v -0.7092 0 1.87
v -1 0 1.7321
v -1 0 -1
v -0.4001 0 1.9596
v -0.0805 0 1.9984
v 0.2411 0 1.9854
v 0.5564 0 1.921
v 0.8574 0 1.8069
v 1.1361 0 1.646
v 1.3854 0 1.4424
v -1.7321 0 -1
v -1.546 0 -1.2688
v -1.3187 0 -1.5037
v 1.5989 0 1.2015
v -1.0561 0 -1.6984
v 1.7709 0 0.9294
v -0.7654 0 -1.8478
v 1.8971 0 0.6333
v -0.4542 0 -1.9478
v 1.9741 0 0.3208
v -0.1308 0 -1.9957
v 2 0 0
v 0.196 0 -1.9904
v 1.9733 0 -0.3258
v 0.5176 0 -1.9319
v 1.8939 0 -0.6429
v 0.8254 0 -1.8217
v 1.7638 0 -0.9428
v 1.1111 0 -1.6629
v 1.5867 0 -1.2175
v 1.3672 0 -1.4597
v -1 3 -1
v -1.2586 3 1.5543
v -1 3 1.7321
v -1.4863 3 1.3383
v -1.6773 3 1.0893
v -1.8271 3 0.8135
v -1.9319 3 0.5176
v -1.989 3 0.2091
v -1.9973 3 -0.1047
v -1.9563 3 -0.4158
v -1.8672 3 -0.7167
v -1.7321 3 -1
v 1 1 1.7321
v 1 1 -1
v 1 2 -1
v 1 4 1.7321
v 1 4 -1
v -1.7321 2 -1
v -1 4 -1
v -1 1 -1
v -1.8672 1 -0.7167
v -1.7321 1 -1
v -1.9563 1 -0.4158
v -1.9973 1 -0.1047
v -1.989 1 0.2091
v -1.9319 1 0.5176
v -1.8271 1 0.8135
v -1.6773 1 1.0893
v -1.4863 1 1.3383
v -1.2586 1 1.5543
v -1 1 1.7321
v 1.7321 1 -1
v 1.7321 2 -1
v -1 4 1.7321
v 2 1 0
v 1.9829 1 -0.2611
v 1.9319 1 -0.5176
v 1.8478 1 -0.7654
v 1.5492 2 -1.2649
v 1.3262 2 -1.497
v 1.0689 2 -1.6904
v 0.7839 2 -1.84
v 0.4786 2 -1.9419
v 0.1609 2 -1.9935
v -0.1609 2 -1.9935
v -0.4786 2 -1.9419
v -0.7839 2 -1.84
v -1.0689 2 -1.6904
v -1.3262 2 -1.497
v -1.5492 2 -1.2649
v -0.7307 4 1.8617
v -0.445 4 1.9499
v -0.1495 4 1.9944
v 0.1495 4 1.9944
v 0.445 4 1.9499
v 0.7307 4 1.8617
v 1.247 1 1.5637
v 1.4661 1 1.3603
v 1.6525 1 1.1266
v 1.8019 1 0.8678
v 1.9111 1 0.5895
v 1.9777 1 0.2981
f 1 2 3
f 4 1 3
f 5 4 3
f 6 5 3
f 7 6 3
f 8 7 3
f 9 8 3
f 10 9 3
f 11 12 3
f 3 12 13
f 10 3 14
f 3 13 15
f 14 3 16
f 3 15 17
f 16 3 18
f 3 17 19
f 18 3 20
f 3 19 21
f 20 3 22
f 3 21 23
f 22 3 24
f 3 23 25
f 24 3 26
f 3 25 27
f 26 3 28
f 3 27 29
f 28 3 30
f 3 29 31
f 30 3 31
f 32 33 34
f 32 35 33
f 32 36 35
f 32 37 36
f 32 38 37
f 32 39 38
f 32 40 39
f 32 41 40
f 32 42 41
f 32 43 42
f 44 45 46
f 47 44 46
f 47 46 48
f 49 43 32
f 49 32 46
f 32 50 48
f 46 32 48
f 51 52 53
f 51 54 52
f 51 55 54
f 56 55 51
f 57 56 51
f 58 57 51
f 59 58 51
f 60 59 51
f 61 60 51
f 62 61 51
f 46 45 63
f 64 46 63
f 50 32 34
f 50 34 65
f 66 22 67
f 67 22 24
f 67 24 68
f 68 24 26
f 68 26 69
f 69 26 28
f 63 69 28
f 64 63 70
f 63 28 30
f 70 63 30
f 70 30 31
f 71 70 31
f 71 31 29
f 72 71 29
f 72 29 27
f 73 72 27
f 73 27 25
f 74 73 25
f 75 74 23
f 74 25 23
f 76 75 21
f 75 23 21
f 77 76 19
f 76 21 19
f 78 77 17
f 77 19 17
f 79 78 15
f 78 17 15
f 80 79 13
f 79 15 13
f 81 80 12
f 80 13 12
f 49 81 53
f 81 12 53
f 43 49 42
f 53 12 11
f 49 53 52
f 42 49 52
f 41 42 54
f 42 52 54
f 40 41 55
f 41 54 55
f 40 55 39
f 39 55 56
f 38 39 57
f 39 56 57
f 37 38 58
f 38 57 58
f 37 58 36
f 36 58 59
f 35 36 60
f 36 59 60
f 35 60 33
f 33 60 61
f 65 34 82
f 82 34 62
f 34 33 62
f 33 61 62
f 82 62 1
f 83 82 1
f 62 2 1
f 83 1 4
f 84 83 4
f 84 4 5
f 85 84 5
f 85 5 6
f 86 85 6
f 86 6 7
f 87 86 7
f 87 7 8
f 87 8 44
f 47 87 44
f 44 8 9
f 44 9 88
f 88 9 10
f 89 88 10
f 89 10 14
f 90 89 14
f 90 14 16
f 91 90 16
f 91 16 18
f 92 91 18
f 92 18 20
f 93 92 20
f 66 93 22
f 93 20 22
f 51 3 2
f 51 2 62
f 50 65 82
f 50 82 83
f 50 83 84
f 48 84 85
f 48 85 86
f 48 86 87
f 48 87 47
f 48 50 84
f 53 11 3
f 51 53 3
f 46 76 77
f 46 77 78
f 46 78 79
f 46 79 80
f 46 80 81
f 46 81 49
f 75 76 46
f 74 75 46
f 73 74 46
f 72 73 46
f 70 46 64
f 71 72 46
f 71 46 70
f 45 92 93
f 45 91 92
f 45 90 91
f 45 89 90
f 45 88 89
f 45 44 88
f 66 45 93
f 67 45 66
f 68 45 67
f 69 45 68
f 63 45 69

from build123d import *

# Parameters (mm, degrees)
SKETCH1_R               = 2
BOSS_EXTRUDE1_DEPTH     = 4
SKETCH2_W               = 1
SKETCH2_H               = 1
SKETCH2_H_2             = 3
CUT_EXTRUDE1_DEPTH      = 4
CUT_EXTRUDE1_DEPTH_BACK = 1
CUT_EXTRUDE2_DEPTH      = 2


with BuildPart() as part:
    # Sketch1 → Boss-Extrude1 (new body)
    with BuildSketch(Plane(origin=(0, 0, 0), x_dir=(1, 0, 0), z_dir=(0, 1, 0))):
        Circle(SKETCH1_R)
    extrude(amount=BOSS_EXTRUDE1_DEPTH)

    # Sketch2 → Cut-Extrude1 (cut, two sides)
    with BuildSketch(Plane.XY) as cut_extrude1_sk:
        with Locations((-1.5, 3.5)):
            Rectangle(SKETCH2_W, SKETCH2_H)
        with Locations((1.5, 2.5)):
            Rectangle(SKETCH2_W, SKETCH2_H_2)
        with Locations((-1.5, 0.5)):
            Rectangle(SKETCH2_W, SKETCH2_H)
    extrude(amount=CUT_EXTRUDE1_DEPTH, mode=Mode.SUBTRACT)
    extrude(cut_extrude1_sk.sketch, amount=-CUT_EXTRUDE1_DEPTH_BACK, mode=Mode.SUBTRACT)

    # Sketch3 → Cut-Extrude2 (cut)
    with BuildSketch(Plane(origin=(0, 4, 0), x_dir=(1, 0, 0), z_dir=(0, 1, 0))):
        with BuildLine():
            Line((-1.732050808, 1), (1.732050808, 1))
            ThreePointArc((1.732050808, 1), (0, 2), (-1.732050808, 1))
        make_face()
    extrude(amount=-CUT_EXTRUDE2_DEPTH, mode=Mode.SUBTRACT)


solid = part.part
